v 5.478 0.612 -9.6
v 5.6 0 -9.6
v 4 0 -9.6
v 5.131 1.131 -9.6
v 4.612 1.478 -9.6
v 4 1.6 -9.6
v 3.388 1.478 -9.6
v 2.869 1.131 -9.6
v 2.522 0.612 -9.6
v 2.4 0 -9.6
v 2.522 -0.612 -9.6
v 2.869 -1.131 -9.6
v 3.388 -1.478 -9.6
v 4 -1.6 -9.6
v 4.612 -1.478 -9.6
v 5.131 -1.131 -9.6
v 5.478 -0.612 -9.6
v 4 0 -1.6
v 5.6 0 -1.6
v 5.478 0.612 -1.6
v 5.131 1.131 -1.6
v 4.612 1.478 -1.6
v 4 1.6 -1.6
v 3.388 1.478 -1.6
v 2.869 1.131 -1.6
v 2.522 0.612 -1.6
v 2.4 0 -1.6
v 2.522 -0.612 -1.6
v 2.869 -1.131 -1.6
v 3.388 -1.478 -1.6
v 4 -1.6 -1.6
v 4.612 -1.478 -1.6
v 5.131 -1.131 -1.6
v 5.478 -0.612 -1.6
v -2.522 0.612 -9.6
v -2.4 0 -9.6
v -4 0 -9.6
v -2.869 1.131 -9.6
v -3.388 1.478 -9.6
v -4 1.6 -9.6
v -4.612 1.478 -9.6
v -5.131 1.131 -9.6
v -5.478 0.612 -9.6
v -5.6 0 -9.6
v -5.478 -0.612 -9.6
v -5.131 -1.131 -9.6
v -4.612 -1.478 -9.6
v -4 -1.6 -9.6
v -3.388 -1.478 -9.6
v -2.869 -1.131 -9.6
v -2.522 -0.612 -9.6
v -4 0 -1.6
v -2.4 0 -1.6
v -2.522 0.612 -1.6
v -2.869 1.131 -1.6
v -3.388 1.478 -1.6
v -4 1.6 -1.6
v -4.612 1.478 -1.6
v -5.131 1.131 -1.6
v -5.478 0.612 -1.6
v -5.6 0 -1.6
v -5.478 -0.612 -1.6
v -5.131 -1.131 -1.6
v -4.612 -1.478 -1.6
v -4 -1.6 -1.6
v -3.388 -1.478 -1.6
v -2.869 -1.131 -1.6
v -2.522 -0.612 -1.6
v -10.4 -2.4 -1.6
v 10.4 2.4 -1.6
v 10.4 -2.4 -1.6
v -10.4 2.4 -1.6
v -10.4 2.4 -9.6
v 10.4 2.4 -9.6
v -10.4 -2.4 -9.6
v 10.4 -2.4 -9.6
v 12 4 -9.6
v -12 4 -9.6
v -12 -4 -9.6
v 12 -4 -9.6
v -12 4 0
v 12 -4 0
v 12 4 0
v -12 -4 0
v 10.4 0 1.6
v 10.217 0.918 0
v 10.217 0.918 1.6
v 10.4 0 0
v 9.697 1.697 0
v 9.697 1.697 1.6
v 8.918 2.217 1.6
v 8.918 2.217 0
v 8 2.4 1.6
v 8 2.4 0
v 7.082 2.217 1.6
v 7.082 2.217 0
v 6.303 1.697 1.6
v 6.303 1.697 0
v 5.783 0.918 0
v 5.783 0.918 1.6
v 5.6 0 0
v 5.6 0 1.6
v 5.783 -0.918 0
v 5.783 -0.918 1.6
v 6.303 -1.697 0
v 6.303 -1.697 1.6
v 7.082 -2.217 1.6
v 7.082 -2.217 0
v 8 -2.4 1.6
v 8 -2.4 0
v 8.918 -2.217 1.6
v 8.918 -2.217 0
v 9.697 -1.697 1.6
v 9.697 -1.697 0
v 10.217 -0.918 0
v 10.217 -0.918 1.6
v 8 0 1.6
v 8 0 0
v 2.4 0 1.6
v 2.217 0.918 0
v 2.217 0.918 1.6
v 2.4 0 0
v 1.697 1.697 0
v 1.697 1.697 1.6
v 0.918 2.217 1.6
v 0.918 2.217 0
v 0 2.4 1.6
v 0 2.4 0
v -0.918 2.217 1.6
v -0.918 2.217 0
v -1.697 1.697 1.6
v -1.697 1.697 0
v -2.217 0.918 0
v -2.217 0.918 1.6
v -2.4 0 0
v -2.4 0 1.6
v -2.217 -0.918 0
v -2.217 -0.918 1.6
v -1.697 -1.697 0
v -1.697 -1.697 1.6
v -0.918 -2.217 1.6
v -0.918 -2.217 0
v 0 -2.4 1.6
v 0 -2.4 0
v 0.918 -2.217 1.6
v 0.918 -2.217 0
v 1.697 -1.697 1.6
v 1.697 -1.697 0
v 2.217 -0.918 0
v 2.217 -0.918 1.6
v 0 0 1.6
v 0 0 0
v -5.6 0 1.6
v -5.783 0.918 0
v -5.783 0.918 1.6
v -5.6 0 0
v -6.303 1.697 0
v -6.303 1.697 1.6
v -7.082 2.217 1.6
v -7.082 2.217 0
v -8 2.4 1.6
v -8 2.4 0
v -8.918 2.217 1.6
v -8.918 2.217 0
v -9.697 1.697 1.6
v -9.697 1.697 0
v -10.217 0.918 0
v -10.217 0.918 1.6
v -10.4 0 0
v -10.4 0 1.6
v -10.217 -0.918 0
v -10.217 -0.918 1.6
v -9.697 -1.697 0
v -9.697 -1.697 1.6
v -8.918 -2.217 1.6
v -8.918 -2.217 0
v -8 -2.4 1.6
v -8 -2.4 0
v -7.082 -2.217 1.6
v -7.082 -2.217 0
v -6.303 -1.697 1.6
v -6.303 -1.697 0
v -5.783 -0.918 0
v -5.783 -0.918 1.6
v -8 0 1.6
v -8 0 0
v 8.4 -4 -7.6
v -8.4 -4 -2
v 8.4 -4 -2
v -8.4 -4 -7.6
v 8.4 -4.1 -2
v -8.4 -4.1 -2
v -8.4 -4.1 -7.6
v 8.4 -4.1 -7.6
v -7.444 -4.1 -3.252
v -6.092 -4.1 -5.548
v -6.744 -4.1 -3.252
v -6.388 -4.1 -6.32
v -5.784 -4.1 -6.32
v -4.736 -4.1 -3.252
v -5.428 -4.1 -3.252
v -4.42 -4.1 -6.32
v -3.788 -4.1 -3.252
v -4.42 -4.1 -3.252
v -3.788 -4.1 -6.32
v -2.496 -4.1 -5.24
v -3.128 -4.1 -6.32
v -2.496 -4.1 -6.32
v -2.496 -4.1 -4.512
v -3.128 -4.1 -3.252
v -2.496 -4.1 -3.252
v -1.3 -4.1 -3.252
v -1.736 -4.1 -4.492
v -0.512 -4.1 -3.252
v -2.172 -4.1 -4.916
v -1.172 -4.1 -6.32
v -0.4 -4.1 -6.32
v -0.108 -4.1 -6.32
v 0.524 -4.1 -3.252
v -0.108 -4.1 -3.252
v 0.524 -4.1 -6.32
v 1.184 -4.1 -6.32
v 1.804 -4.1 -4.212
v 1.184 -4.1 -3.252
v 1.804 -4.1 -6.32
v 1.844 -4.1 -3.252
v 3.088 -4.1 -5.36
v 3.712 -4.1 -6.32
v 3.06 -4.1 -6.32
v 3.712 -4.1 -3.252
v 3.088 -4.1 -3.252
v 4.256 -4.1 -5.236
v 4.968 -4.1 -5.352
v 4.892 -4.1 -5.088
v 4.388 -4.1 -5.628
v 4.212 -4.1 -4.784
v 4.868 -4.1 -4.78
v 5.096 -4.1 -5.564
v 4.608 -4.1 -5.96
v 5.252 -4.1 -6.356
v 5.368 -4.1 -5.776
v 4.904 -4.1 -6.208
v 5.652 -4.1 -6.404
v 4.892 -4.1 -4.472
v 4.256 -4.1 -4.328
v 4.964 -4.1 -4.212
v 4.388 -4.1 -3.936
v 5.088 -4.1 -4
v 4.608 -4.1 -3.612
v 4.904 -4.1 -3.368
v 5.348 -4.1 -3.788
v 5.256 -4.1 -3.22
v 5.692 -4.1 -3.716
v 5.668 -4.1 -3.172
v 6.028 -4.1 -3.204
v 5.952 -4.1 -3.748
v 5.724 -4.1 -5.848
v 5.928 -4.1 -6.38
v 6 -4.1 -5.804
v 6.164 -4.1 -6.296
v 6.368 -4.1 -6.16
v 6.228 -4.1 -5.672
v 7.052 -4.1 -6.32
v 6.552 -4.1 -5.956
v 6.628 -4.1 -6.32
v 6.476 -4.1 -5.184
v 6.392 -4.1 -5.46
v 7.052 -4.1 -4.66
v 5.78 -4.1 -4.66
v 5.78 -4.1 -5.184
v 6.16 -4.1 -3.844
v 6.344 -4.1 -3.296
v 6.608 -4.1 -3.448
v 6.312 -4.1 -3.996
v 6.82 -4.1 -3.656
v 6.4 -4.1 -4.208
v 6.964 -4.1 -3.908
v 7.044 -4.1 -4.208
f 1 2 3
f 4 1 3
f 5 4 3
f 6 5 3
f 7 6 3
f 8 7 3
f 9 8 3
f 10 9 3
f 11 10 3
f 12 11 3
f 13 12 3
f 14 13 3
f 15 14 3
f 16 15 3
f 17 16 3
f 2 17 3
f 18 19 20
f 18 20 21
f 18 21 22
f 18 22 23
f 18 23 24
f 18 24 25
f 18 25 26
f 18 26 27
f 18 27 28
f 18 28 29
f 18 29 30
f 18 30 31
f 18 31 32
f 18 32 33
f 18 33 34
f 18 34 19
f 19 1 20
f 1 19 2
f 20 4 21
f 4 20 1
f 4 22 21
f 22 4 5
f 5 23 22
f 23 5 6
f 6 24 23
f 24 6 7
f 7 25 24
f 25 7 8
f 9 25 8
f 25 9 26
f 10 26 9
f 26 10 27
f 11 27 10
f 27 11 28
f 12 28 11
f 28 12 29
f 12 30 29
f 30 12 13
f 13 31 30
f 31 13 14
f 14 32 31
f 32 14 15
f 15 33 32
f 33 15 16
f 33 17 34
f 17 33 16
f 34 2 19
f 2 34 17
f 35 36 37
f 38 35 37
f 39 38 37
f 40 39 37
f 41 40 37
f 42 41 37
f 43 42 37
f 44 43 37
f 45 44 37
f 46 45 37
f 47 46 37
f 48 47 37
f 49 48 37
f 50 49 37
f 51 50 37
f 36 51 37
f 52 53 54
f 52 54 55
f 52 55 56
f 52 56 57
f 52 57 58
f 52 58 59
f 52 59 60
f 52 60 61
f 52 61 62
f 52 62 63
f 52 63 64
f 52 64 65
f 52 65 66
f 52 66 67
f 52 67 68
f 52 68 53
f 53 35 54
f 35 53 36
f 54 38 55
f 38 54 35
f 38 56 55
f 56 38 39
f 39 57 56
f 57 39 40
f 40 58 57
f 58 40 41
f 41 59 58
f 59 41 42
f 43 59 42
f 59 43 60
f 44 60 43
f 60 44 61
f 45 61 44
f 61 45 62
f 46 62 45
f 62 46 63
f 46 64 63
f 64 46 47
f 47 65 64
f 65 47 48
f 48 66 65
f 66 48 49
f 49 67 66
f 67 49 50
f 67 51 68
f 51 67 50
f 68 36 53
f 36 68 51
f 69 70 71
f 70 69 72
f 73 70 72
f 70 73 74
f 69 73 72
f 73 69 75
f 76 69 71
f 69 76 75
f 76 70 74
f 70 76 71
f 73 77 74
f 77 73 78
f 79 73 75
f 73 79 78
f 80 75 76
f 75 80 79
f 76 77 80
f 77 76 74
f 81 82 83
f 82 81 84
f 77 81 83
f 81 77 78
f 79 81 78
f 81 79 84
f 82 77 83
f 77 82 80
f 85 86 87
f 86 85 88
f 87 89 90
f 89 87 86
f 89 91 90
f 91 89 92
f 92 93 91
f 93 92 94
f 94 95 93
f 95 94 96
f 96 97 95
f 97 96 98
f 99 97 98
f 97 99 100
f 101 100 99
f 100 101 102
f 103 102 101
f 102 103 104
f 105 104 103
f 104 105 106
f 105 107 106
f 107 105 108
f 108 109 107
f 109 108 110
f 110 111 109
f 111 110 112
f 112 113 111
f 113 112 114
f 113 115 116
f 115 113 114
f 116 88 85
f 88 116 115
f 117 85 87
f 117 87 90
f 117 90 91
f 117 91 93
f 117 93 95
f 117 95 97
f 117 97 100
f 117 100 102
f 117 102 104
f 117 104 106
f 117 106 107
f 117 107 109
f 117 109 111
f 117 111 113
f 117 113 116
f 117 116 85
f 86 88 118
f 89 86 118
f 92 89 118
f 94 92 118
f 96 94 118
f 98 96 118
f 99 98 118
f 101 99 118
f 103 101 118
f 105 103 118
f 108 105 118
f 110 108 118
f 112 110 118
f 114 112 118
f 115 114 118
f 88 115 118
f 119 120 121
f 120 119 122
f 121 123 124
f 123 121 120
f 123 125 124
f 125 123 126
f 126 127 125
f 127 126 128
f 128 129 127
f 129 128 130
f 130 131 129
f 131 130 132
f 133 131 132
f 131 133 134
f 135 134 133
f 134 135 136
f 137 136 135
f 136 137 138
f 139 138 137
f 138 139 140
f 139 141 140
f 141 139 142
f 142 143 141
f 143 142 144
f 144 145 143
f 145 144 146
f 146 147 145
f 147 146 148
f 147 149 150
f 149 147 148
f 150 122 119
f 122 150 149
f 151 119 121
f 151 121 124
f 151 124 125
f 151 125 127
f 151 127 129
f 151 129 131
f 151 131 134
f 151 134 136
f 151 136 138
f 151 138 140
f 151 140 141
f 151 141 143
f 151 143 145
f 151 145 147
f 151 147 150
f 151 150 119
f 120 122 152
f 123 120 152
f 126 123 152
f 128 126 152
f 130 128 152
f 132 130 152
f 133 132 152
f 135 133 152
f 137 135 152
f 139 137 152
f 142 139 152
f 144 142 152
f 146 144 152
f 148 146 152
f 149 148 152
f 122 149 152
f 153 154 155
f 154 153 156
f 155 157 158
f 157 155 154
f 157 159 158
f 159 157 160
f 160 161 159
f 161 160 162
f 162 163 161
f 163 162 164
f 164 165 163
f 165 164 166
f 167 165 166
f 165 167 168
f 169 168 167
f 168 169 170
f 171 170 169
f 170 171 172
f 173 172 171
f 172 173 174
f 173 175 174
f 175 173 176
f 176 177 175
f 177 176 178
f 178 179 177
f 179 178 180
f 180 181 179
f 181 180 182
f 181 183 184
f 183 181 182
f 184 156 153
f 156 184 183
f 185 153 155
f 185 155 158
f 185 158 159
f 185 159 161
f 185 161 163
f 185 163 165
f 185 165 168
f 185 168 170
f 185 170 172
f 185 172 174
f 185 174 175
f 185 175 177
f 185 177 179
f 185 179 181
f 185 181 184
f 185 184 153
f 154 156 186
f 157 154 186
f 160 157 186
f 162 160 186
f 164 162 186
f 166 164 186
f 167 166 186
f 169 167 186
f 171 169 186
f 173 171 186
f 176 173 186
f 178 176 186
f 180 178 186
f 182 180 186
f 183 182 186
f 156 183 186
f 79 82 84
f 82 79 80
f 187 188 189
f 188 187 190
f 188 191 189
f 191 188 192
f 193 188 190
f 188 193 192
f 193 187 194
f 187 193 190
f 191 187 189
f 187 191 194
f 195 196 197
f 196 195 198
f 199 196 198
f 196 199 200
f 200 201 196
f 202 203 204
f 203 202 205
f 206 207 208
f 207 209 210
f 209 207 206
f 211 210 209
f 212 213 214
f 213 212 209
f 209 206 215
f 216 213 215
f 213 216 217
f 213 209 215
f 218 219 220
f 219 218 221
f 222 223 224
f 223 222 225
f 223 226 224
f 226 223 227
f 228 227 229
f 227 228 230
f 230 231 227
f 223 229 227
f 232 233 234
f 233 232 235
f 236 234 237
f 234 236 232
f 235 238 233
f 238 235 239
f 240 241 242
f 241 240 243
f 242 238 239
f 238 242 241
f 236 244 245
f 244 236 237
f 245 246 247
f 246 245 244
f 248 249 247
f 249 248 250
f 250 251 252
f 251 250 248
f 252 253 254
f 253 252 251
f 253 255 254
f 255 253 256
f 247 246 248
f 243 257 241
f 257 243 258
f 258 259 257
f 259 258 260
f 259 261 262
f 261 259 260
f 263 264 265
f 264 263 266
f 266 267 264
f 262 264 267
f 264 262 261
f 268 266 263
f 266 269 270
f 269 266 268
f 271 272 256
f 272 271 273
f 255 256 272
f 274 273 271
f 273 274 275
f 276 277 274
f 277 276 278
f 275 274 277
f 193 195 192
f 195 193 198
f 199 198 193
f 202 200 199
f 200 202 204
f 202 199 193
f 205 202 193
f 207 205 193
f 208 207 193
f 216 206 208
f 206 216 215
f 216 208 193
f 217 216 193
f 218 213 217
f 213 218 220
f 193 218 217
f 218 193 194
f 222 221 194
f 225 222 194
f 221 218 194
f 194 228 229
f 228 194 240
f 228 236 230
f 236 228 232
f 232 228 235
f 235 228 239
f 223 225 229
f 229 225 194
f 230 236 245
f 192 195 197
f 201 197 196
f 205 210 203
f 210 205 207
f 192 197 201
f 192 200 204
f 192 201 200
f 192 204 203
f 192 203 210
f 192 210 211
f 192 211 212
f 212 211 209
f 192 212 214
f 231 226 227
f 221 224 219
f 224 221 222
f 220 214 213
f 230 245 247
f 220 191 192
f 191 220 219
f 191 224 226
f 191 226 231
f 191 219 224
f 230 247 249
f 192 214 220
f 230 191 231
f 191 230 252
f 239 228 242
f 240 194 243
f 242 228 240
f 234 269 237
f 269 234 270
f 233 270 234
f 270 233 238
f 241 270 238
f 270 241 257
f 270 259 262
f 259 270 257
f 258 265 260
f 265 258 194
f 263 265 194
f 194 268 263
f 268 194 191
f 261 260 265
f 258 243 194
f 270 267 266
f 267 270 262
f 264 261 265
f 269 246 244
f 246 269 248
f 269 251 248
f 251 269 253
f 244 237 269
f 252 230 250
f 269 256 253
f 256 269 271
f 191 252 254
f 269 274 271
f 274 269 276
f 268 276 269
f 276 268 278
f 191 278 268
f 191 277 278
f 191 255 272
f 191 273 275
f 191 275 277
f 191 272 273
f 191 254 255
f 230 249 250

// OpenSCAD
// file: ../p/4-4edge.scad
use <../lib.scad>
function ldraw_lib__4_4edge() = [
// 0 Circle 1.0
// 0 Name: 4-4edge.dat
// 0 Author: James Jessiman
// 0 !LDRAW_ORG Primitive UPDATE 2017-01
// 0 !LICENSE Licensed under CC BY 2.0 and CC BY 4.0 : see CAreadme.txt
// 
// 0 BFC CERTIFY CCW
  [0,"BFC","CERTIFY"],
  [0,"BFC","CCW"],
// 
// 0 !HISTORY 1998-12-15 [PTadmin] Official Update 1998-10
// 0 !HISTORY 2005-12-28 [PTadmin] Official Update 2005-01
// 0 !HISTORY 2007-06-24 [PTadmin] Header formatted for Contributor Agreement
// 0 !HISTORY 2008-07-01 [PTadmin] Official Update 2008-01
// 0 !HISTORY 2017-01-15 [Steffen] BFCed
// 0 !HISTORY 2017-12-30 [PTadmin] Official Update 2017-01
// 
// 
// 2 24 1 0 0 0.9239 0 0.3827
  [2,24,1,0,0,0.9239,0,0.3827],
// 2 24 0.9239 0 0.3827 0.7071 0 0.7071
  [2,24,0.9239,0,0.3827,0.7071,0,0.7071],
// 2 24 0.7071 0 0.7071 0.3827 0 0.9239
  [2,24,0.7071,0,0.7071,0.3827,0,0.9239],
// 2 24 0.3827 0 0.9239 0 0 1
  [2,24,0.3827,0,0.9239,0,0,1],
// 2 24 0 0 1 -0.3827 0 0.9239
  [2,24,0,0,1,-0.3827,0,0.9239],
// 2 24 -0.3827 0 0.9239 -0.7071 0 0.7071
  [2,24,-0.3827,0,0.9239,-0.7071,0,0.7071],
// 2 24 -0.7071 0 0.7071 -0.9239 0 0.3827
  [2,24,-0.7071,0,0.7071,-0.9239,0,0.3827],
// 2 24 -0.9239 0 0.3827 -1 0 -0
  [2,24,-0.9239,0,0.3827,-1,0,-0],
// 2 24 -1 0 -0 -0.9239 0 -0.3827
  [2,24,-1,0,-0,-0.9239,0,-0.3827],
// 2 24 -0.9239 0 -0.3827 -0.7071 0 -0.7071
  [2,24,-0.9239,0,-0.3827,-0.7071,0,-0.7071],
// 2 24 -0.7071 0 -0.7071 -0.3827 0 -0.9239
  [2,24,-0.7071,0,-0.7071,-0.3827,0,-0.9239],
// 2 24 -0.3827 0 -0.9239 0 0 -1
  [2,24,-0.3827,0,-0.9239,0,0,-1],
// 2 24 0 0 -1 0.3827 0 -0.9239
  [2,24,0,0,-1,0.3827,0,-0.9239],
// 2 24 0.3827 0 -0.9239 0.7071 0 -0.7071
  [2,24,0.3827,0,-0.9239,0.7071,0,-0.7071],
// 2 24 0.7071 0 -0.7071 0.9239 0 -0.3827
  [2,24,0.7071,0,-0.7071,0.9239,0,-0.3827],
// 2 24 0.9239 0 -0.3827 1 0 0
  [2,24,0.9239,0,-0.3827,1,0,0],
];
module ldraw_lib__4_4edge(step=0, col=false, unit=2/5, alt=false, line=0.2, solid=!$preview)
    makepoly(ldraw_lib__4_4edge(), step=step, col=col, unit=unit, alt=alt, line=line, solid=solid);
ldraw_lib__4_4edge(line=0.2);
// file: ../p/4-4disc.scad
use <../lib.scad>
function ldraw_lib__4_4disc() = [
// 0 Disc 1.0
// 0 Name: 4-4disc.dat
// 0 Author: James Jessiman
// 0 !LDRAW_ORG Primitive UPDATE 2002-02
// 0 !LICENSE Licensed under CC BY 2.0 and CC BY 4.0 : see CAreadme.txt
// 
// 0 BFC CERTIFY CCW
  [0,"BFC","CERTIFY"],
  [0,"BFC","CCW"],
// 
// 0 !HISTORY 1998-12-15 [PTadmin] Official Update 1998-10
// 0 !HISTORY 2002-03-23 [sbliss] Added BFC statement
// 0 !HISTORY 2002-04-25 [PTadmin] Official Update 2002-02
// 0 !HISTORY 2007-06-24 [PTadmin] Header formatted for Contributor Agreement
// 0 !HISTORY 2008-07-01 [PTadmin] Official Update 2008-01
// 
// 
// 3 16 0 0 0 1 0 0 0.9239 0 0.3827
  [3,16,0,0,0,1,0,0,0.9239,0,0.3827],
// 3 16 0 0 0 0.9239 0 0.3827 0.7071 0 0.7071
  [3,16,0,0,0,0.9239,0,0.3827,0.7071,0,0.7071],
// 3 16 0 0 0 0.7071 0 0.7071 0.3827 0 0.9239
  [3,16,0,0,0,0.7071,0,0.7071,0.3827,0,0.9239],
// 3 16 0 0 0 0.3827 0 0.9239 0 0 1
  [3,16,0,0,0,0.3827,0,0.9239,0,0,1],
// 3 16 0 0 0 0 0 1 -0.3827 0 0.9239
  [3,16,0,0,0,0,0,1,-0.3827,0,0.9239],
// 3 16 0 0 0 -0.3827 0 0.9239 -0.7071 0 0.7071
  [3,16,0,0,0,-0.3827,0,0.9239,-0.7071,0,0.7071],
// 3 16 0 0 0 -0.7071 0 0.7071 -0.9239 0 0.3827
  [3,16,0,0,0,-0.7071,0,0.7071,-0.9239,0,0.3827],
// 3 16 0 0 0 -0.9239 0 0.3827 -1 0 -0
  [3,16,0,0,0,-0.9239,0,0.3827,-1,0,-0],
// 3 16 0 0 0 -1 0 -0 -0.9239 0 -0.3827
  [3,16,0,0,0,-1,0,-0,-0.9239,0,-0.3827],
// 3 16 0 0 0 -0.9239 0 -0.3827 -0.7071 0 -0.7071
  [3,16,0,0,0,-0.9239,0,-0.3827,-0.7071,0,-0.7071],
// 3 16 0 0 0 -0.7071 0 -0.7071 -0.3827 0 -0.9239
  [3,16,0,0,0,-0.7071,0,-0.7071,-0.3827,0,-0.9239],
// 3 16 0 0 0 -0.3827 0 -0.9239 0 0 -1
  [3,16,0,0,0,-0.3827,0,-0.9239,0,0,-1],
// 3 16 0 0 0 0 0 -1 0.3827 0 -0.9239
  [3,16,0,0,0,0,0,-1,0.3827,0,-0.9239],
// 3 16 0 0 0 0.3827 0 -0.9239 0.7071 0 -0.7071
  [3,16,0,0,0,0.3827,0,-0.9239,0.7071,0,-0.7071],
// 3 16 0 0 0 0.7071 0 -0.7071 0.9239 0 -0.3827
  [3,16,0,0,0,0.7071,0,-0.7071,0.9239,0,-0.3827],
// 3 16 0 0 0 0.9239 0 -0.3827 1 0 0
  [3,16,0,0,0,0.9239,0,-0.3827,1,0,0],
// 0
];
module ldraw_lib__4_4disc(step=0, col=false, unit=2/5, alt=false, line=0.2, solid=!$preview)
    makepoly(ldraw_lib__4_4disc(), step=step, col=col, unit=unit, alt=alt, line=line, solid=solid);
ldraw_lib__4_4disc(line=0.2);
// file: ../p/4-4cyli.scad
use <../lib.scad>
$fa=1; $fs=0.2;
function ldraw_lib__4_4cyli(realsolid=false) = [
// 0 Cylinder 1.0
// 0 Name: 4-4cyli.dat
// 0 Author: James Jessiman
// 0 !LDRAW_ORG Primitive UPDATE 2005-01
// 0 !LICENSE Licensed under CC BY 2.0 and CC BY 4.0 : see CAreadme.txt
// 
// 0 BFC CERTIFY CCW
  [0,"BFC","CERTIFY"],
  [0,"BFC","CCW"],
// 
// 0 !HISTORY 1998-12-15 [PTadmin] Official Update 1998-10
// 0 !HISTORY 2002-03-23 [sbliss] Added BFC statement; merged headers from files in distributions LDraw 0.27 and Complete.
// 0 !HISTORY 2002-04-25 [PTadmin] Official Update 2002-02
// 0 !HISTORY 2004-12-14 [guyvivan] BFC CCW
// 0 !HISTORY 2005-12-28 [PTadmin] Official Update 2005-01
// 0 !HISTORY 2007-06-24 [PTadmin] Header formatted for Contributor Agreement
// 0 !HISTORY 2008-07-01 [PTadmin] Official Update 2008-01
// 
// 
// 4 16 1 1 0 0.9239 1 0.3827 0.9239 0 0.3827 1 0 0
  [4,16,1,1,0,0.9239,1,0.3827,0.9239,0,0.3827,1,0,0],
// 5 24 1 0 0 1 1 0 0.9239 0 0.3827 0.9239 0 -0.3827
  [5,24,1,0,0,1,1,0,0.9239,0,0.3827,0.9239,0,-0.3827],
// 4 16 0.9239 1 0.3827 0.7071 1 0.7071 0.7071 0 0.7071 0.9239 0 0.3827
  [4,16,0.9239,1,0.3827,0.7071,1,0.7071,0.7071,0,0.7071,0.9239,0,0.3827],
// 5 24 0.9239 0 0.3827 0.9239 1 0.3827 0.7071 0 0.7071 1 0 0
  [5,24,0.9239,0,0.3827,0.9239,1,0.3827,0.7071,0,0.7071,1,0,0],
// 4 16 0.7071 1 0.7071 0.3827 1 0.9239 0.3827 0 0.9239 0.7071 0 0.7071
  [4,16,0.7071,1,0.7071,0.3827,1,0.9239,0.3827,0,0.9239,0.7071,0,0.7071],
// 5 24 0.7071 0 0.7071 0.7071 1 0.7071 0.3827 0 0.9239 0.9239 0 0.3827
  [5,24,0.7071,0,0.7071,0.7071,1,0.7071,0.3827,0,0.9239,0.9239,0,0.3827],
// 4 16 0.3827 1 0.9239 0 1 1 0 0 1 0.3827 0 0.9239
  [4,16,0.3827,1,0.9239,0,1,1,0,0,1,0.3827,0,0.9239],
// 5 24 0.3827 0 0.9239 0.3827 1 0.9239 0 0 1 0.7071 0 0.7071
  [5,24,0.3827,0,0.9239,0.3827,1,0.9239,0,0,1,0.7071,0,0.7071],
// 4 16 0 1 1 -0.3827 1 0.9239 -0.3827 0 0.9239 0 0 1
  [4,16,0,1,1,-0.3827,1,0.9239,-0.3827,0,0.9239,0,0,1],
// 5 24 0 0 1 0 1 1 -0.3827 0 0.9239 0.3827 0 0.9239
  [5,24,0,0,1,0,1,1,-0.3827,0,0.9239,0.3827,0,0.9239],
// 4 16 -0.3827 1 0.9239 -0.7071 1 0.7071 -0.7071 0 0.7071 -0.3827 0 0.9239
  [4,16,-0.3827,1,0.9239,-0.7071,1,0.7071,-0.7071,0,0.7071,-0.3827,0,0.9239],
// 5 24 -0.3827 0 0.9239 -0.3827 1 0.9239 -0.7071 0 0.7071 0 0 1
  [5,24,-0.3827,0,0.9239,-0.3827,1,0.9239,-0.7071,0,0.7071,0,0,1],
// 4 16 -0.7071 1 0.7071 -0.9239 1 0.3827 -0.9239 0 0.3827 -0.7071 0 0.7071
  [4,16,-0.7071,1,0.7071,-0.9239,1,0.3827,-0.9239,0,0.3827,-0.7071,0,0.7071],
// 5 24 -0.7071 0 0.7071 -0.7071 1 0.7071 -0.9239 0 0.3827 -0.3827 0 0.9239
  [5,24,-0.7071,0,0.7071,-0.7071,1,0.7071,-0.9239,0,0.3827,-0.3827,0,0.9239],
// 4 16 -0.9239 1 0.3827 -1 1 0 -1 0 0 -0.9239 0 0.3827
  [4,16,-0.9239,1,0.3827,-1,1,0,-1,0,0,-0.9239,0,0.3827],
// 5 24 -0.9239 0 0.3827 -0.9239 1 0.3827 -1 0 0 -0.7071 0 0.7071
  [5,24,-0.9239,0,0.3827,-0.9239,1,0.3827,-1,0,0,-0.7071,0,0.7071],
// 4 16 -1 1 0 -0.9239 1 -0.3827 -0.9239 0 -0.3827 -1 0 0
  [4,16,-1,1,0,-0.9239,1,-0.3827,-0.9239,0,-0.3827,-1,0,0],
// 5 24 -1 0 0 -1 1 0 -0.9239 0 -0.3827 -0.9239 0 0.3827
  [5,24,-1,0,0,-1,1,0,-0.9239,0,-0.3827,-0.9239,0,0.3827],
// 4 16 -0.9239 1 -0.3827 -0.7071 1 -0.7071 -0.7071 0 -0.7071 -0.9239 0 -0.3827
  [4,16,-0.9239,1,-0.3827,-0.7071,1,-0.7071,-0.7071,0,-0.7071,-0.9239,0,-0.3827],
// 5 24 -0.9239 0 -0.3827 -0.9239 1 -0.3827 -0.7071 0 -0.7071 -1 0 0
  [5,24,-0.9239,0,-0.3827,-0.9239,1,-0.3827,-0.7071,0,-0.7071,-1,0,0],
// 4 16 -0.7071 1 -0.7071 -0.3827 1 -0.9239 -0.3827 0 -0.9239 -0.7071 0 -0.7071
  [4,16,-0.7071,1,-0.7071,-0.3827,1,-0.9239,-0.3827,0,-0.9239,-0.7071,0,-0.7071],
// 5 24 -0.7071 0 -0.7071 -0.7071 1 -0.7071 -0.3827 0 -0.9239 -0.9239 0 -0.3827
  [5,24,-0.7071,0,-0.7071,-0.7071,1,-0.7071,-0.3827,0,-0.9239,-0.9239,0,-0.3827],
// 4 16 -0.3827 1 -0.9239 0 1 -1 0 0 -1 -0.3827 0 -0.9239
  [4,16,-0.3827,1,-0.9239,0,1,-1,0,0,-1,-0.3827,0,-0.9239],
// 5 24 -0.3827 0 -0.9239 -0.3827 1 -0.9239 0 0 -1 -0.7071 0 -0.7071
  [5,24,-0.3827,0,-0.9239,-0.3827,1,-0.9239,0,0,-1,-0.7071,0,-0.7071],
// 4 16 0 1 -1 0.3827 1 -0.9239 0.3827 0 -0.9239 0 0 -1
  [4,16,0,1,-1,0.3827,1,-0.9239,0.3827,0,-0.9239,0,0,-1],
// 5 24 0 0 -1 0 1 -1 0.3827 0 -0.9239 -0.3827 0 -0.9239
  [5,24,0,0,-1,0,1,-1,0.3827,0,-0.9239,-0.3827,0,-0.9239],
// 4 16 0.3827 1 -0.9239 0.7071 1 -0.7071 0.7071 0 -0.7071 0.3827 0 -0.9239
  [4,16,0.3827,1,-0.9239,0.7071,1,-0.7071,0.7071,0,-0.7071,0.3827,0,-0.9239],
// 5 24 0.3827 0 -0.9239 0.3827 1 -0.9239 0.7071 0 -0.7071 0 0 -1
  [5,24,0.3827,0,-0.9239,0.3827,1,-0.9239,0.7071,0,-0.7071,0,0,-1],
// 4 16 0.7071 1 -0.7071 0.9239 1 -0.3827 0.9239 0 -0.3827 0.7071 0 -0.7071
  [4,16,0.7071,1,-0.7071,0.9239,1,-0.3827,0.9239,0,-0.3827,0.7071,0,-0.7071],
// 5 24 0.7071 0 -0.7071 0.7071 1 -0.7071 0.9239 0 -0.3827 0.3827 0 -0.9239
  [5,24,0.7071,0,-0.7071,0.7071,1,-0.7071,0.9239,0,-0.3827,0.3827,0,-0.9239],
// 4 16 0.9239 1 -0.3827 1 1 0 1 0 0 0.9239 0 -0.3827
  [4,16,0.9239,1,-0.3827,1,1,0,1,0,0,0.9239,0,-0.3827],
// 5 24 0.9239 0 -0.3827 0.9239 1 -0.3827 1 0 0 0.7071 0 -0.7071
  [5,24,0.9239,0,-0.3827,0.9239,1,-0.3827,1,0,0,0.7071,0,-0.7071],
// 0
];
module ldraw_lib__4_4cyli(step=0, col=false, unit=2/5, alt=false, line=0.2, solid=!$preview)
    makepoly(ldraw_lib__4_4cyli(solid), step=step, col=col, unit=unit, alt=alt, line=line, solid=solid);
ldraw_lib__4_4cyli(line=0.2);
// file: ../p/stud3.scad
use <../lib.scad>
use <4-4cyli.scad>
use <4-4disc.scad>
use <4-4edge.scad>
function ldraw_lib__stud3() = [
// 0 Stud Tube Solid
// 0 Name: stud3.dat
// 0 Author: James Jessiman
// 0 !LDRAW_ORG Primitive UPDATE 2012-01
// 0 !LICENSE Licensed under CC BY 4.0 : see CAreadme.txt
// 
// 0 BFC CERTIFY CCW
  [0,"BFC","CERTIFY"],
  [0,"BFC","CCW"],
// 
// 0 !HISTORY 2002-04-04 [sbliss] Modified for BFC compliance
// 0 !HISTORY 2002-04-25 [PTadmin] Official Update 2002-02
// 0 !HISTORY 2007-06-24 [PTadmin] Header formatted for Contributor Agreement
// 0 !HISTORY 2008-07-01 [PTadmin] Official Update 2008-01
// 0 !HISTORY 2012-02-16 [Philo] Changed to CCW
// 0 !HISTORY 2012-03-30 [PTadmin] Official Update 2012-01
// 
// 
// 1 16 0 -4 0 4 0 0 0 1 0 0 0 4 4-4edge.dat
  [1,16,0,-4,0,4,0,0,0,1,0,0,0,4, ldraw_lib__4_4edge()],
// 1 16 0 0 0 4 0 0 0 1 0 0 0 4 4-4edge.dat
  [1,16,0,0,0,4,0,0,0,1,0,0,0,4, ldraw_lib__4_4edge()],
// 1 16 0 -4 0 4 0 0 0 1 0 0 0 4 4-4disc.dat
  [1,16,0,-4,0,4,0,0,0,1,0,0,0,4, ldraw_lib__4_4disc()],
  [-1,16,0,0,0,4,0,0,0,-1,0,0,0,4, ldraw_lib__4_4disc()],
// 1 16 0 -4 0 4 0 0 0 4 0 0 0 4 4-4cyli.dat
  [1,16,0,-4,0,4,0,0,0,4,0,0,0,4, ldraw_lib__4_4cyli()],
];
module ldraw_lib__stud3(step=0, col=false, unit=2/5, alt=false, line=0.2, solid=!$preview)
    makepoly(ldraw_lib__stud3(), step=step, col=col, unit=unit, alt=alt, line=line, solid=solid);
ldraw_lib__stud3(line=0.2);
// file: ../p/stud.scad
use <../lib.scad>
use <4-4cyli.scad>
use <4-4disc.scad>
use <4-4edge.scad>
function ldraw_lib__stud() = [
// 0 Stud
// 0 Name: stud.dat
// 0 Author: James Jessiman
// 0 !LDRAW_ORG Primitive UPDATE 2012-01
// 0 !LICENSE Licensed under CC BY 4.0 : see CAreadme.txt
// 
// 0 BFC CERTIFY CCW
  [0,"BFC","CERTIFY"],
  [0,"BFC","CCW"],
// 
// 0 !HISTORY 2002-04-04 [sbliss] Modified for BFC compliance
// 0 !HISTORY 2002-04-25 [PTadmin] Official Update 2002-02
// 0 !HISTORY 2007-06-24 [PTadmin] Header formatted for Contributor Agreement
// 0 !HISTORY 2008-07-01 [PTadmin] Official Update 2008-01
// 0 !HISTORY 2012-02-16 [Philo] Changed to CCW
// 0 !HISTORY 2012-03-30 [PTadmin] Official Update 2012-01
// 
// 
// 1 16 0 0 0 6 0 0 0 1 0 0 0 6 4-4edge.dat
  [1,16,0,0,0,6,0,0,0,1,0,0,0,6, ldraw_lib__4_4edge()],
// 1 16 0 -4 0 6 0 0 0 1 0 0 0 6 4-4edge.dat
  [1,16,0,-4,0,6,0,0,0,1,0,0,0,6, ldraw_lib__4_4edge()],
// 1 16 0 0 0 6 0 0 0 -4 0 0 0 6 4-4cyli.dat
  [1,16,0,0,0,6,0,0,0,-4,0,0,0,6, ldraw_lib__4_4cyli()],
// 1 16 0 -4 0 6 0 0 0 1 0 0 0 6 4-4disc.dat
  [1,16,0,-4,0,6,0,0,0,1,0,0,0,6, ldraw_lib__4_4disc()],
  [-1,16,0,0,0,6,0,0,0,-1,0,0,0,6, ldraw_lib__4_4disc()],
];
module ldraw_lib__stud(step=0, col=false, unit=2/5, alt=false, line=0.2, solid=!$preview)
    makepoly(ldraw_lib__stud(), step=step, col=col, unit=unit, alt=alt, line=line, solid=solid);
ldraw_lib__stud(line=0.2);
// file: ../p/box5.scad
use <../lib.scad>
function ldraw_lib__box5() = [
// 0 Box with 5 Faces and All Edges
// 0 Name: box5.dat
// 0 Author: James Jessiman
// 0 !LDRAW_ORG Primitive UPDATE 2012-01
// 0 !LICENSE Licensed under CC BY 2.0 and CC BY 4.0 : see CAreadme.txt
// 
// 0 BFC CERTIFY CCW
  [0,"BFC","CERTIFY"],
  [0,"BFC","CCW"],
// 
// 0 !HISTORY 2002-04-03 [sbliss] Modified for BFC compliance
// 0 !HISTORY 2002-04-25 [PTadmin] Official Update 2002-02
// 0 !HISTORY 2007-06-24 [PTadmin] Header formatted for Contributor Agreement
// 0 !HISTORY 2008-07-01 [PTadmin] Official Update 2008-01
// 0 !HISTORY 2012-02-16 [Philo] Changed to CCW
// 0 !HISTORY 2012-03-30 [PTadmin] Official Update 2012-01
// 
// 
// 2 24 1 1 1 -1 1 1
  [2,24,1,1,1,-1,1,1],
// 2 24 -1 1 1 -1 1 -1
  [2,24,-1,1,1,-1,1,-1],
// 2 24 -1 1 -1 1 1 -1
  [2,24,-1,1,-1,1,1,-1],
// 2 24 1 1 -1 1 1 1
  [2,24,1,1,-1,1,1,1],
// 2 24 1 0 1 -1 0 1
  [2,24,1,0,1,-1,0,1],
// 2 24 -1 0 1 -1 0 -1
  [2,24,-1,0,1,-1,0,-1],
// 2 24 -1 0 -1 1 0 -1
  [2,24,-1,0,-1,1,0,-1],
// 2 24 1 0 -1 1 0 1
  [2,24,1,0,-1,1,0,1],
// 2 24 1 0 1 1 1 1
  [2,24,1,0,1,1,1,1],
// 2 24 -1 0 1 -1 1 1
  [2,24,-1,0,1,-1,1,1],
// 2 24 1 0 -1 1 1 -1
  [2,24,1,0,-1,1,1,-1],
// 2 24 -1 0 -1 -1 1 -1
  [2,24,-1,0,-1,-1,1,-1],
// 4 16 -1 1 1 1 1 1 1 1 -1 -1 1 -1
  [4,16,-1,1,1,1,1,1,1,1,-1,-1,1,-1],
// 4 16 -1 1 1 -1 0 1 1 0 1 1 1 1
  [4,16,-1,1,1,-1,0,1,1,0,1,1,1,1],
// 4 16 -1 1 -1 -1 0 -1 -1 0 1 -1 1 1
  [4,16,-1,1,-1,-1,0,-1,-1,0,1,-1,1,1],
// 4 16 1 1 -1 1 0 -1 -1 0 -1 -1 1 -1
  [4,16,1,1,-1,1,0,-1,-1,0,-1,-1,1,-1],
// 4 16 1 1 1 1 0 1 1 0 -1 1 1 -1
  [4,16,1,1,1,1,0,1,1,0,-1,1,1,-1],
];
makepoly(ldraw_lib__box5(), line=0.2);
// file: ../p/box4t.scad
use <../lib.scad>
function ldraw_lib__box4t() = [
// 0 Box with 4 Adjacent Faces and All Edges
// 0 Name: box4t.dat
// 0 Author: Tore Eriksson [Tore_Eriksson]
// 0 !LDRAW_ORG Primitive UPDATE 2003-02
// 0 !LICENSE Licensed under CC BY 2.0 and CC BY 4.0 : see CAreadme.txt
// 
// 0 BFC CERTIFY CCW
  [0,"BFC","CERTIFY"],
  [0,"BFC","CCW"],
// 
// 0 !HISTORY 1997-09-29 [PTadmin] Official Update 1997-15
// 0 !HISTORY 2002-08-31 [izanette] Modified with WINDZ for BFC compliance
// 0 !HISTORY 2003-08-01 [PTadmin] Official Update 2003-02
// 0 !HISTORY 2007-06-24 [PTadmin] Header formatted for Contributor Agreement
// 0 !HISTORY 2008-07-01 [PTadmin] Official Update 2008-01
// 
// 
// 2 24 1 1 1 -1 1 1
  [2,24,1,1,1,-1,1,1],
// 2 24 -1 1 1 -1 1 -1
  [2,24,-1,1,1,-1,1,-1],
// 2 24 -1 1 -1 1 1 -1
  [2,24,-1,1,-1,1,1,-1],
// 2 24 1 1 -1 1 1 1
  [2,24,1,1,-1,1,1,1],
// 2 24 1 0 1 -1 0 1
  [2,24,1,0,1,-1,0,1],
// 2 24 -1 0 1 -1 0 -1
  [2,24,-1,0,1,-1,0,-1],
// 2 24 -1 0 -1 1 0 -1
  [2,24,-1,0,-1,1,0,-1],
// 2 24 1 0 -1 1 0 1
  [2,24,1,0,-1,1,0,1],
// 2 24 1 0 1 1 1 1
  [2,24,1,0,1,1,1,1],
// 2 24 -1 0 1 -1 1 1
  [2,24,-1,0,1,-1,1,1],
// 2 24 1 0 -1 1 1 -1
  [2,24,1,0,-1,1,1,-1],
// 2 24 -1 0 -1 -1 1 -1
  [2,24,-1,0,-1,-1,1,-1],
// 4 16 1 1 1 1 1 -1 -1 1 -1 -1 1 1
  [4,16,1,1,1,1,1,-1,-1,1,-1,-1,1,1],
// 4 16 1 1 1 -1 1 1 -1 0 1 1 0 1
  [4,16,1,1,1,-1,1,1,-1,0,1,1,0,1],
// 4 16 -1 1 1 -1 1 -1 -1 0 -1 -1 0 1
  [4,16,-1,1,1,-1,1,-1,-1,0,-1,-1,0,1],
// 0 4 16 -1 1 -1 -1 0 -1 1 0 -1 1 1 -1
// 4 16 1 1 -1 1 1 1 1 0 1 1 0 -1
  [4,16,1,1,-1,1,1,1,1,0,1,1,0,-1],
// 0
];
makepoly(ldraw_lib__box4t(), line=0.2);
// file: ../p/box5-12.scad
use <../lib.scad>
function ldraw_lib__box5_12() = [
// 0 Box with 5 Faces without Any Edges
// 0 Name: box5-12.dat
// 0 Author: Chris Dee [cwdee]
// 0 !LDRAW_ORG Primitive UPDATE 2009-02
// 0 !LICENSE Licensed under CC BY 2.0 and CC BY 4.0 : see CAreadme.txt
// 
// 0 BFC CERTIFY CCW
  [0,"BFC","CERTIFY"],
  [0,"BFC","CCW"],
// 
// 0 !HISTORY 2009-09-03 [PTadmin] Official Update 2009-02
// 
// 
// 4 16 1 1 1 1 1 -1 -1 1 -1 -1 1 1
  [4,16,1,1,1,1,1,-1,-1,1,-1,-1,1,1],
// 4 16 -1 0 1 1 0 1 1 1 1 -1 1 1
  [4,16,-1,0,1,1,0,1,1,1,1,-1,1,1],
// 4 16 -1 0 -1 -1 0 1 -1 1 1 -1 1 -1
  [4,16,-1,0,-1,-1,0,1,-1,1,1,-1,1,-1],
// 4 16 1 0 -1 -1 0 -1 -1 1 -1 1 1 -1
  [4,16,1,0,-1,-1,0,-1,-1,1,-1,1,1,-1],
// 4 16 1 0 1 1 0 -1 1 1 -1 1 1 1
  [4,16,1,0,1,1,0,-1,1,1,-1,1,1,1],
// 0
];
module ldraw_lib__box5_12(step=0, col=false, unit=2/5, alt=false, line=0.2, solid=!$preview)
    makepoly(ldraw_lib__box5_12(), step=step, col=col, unit=unit, alt=alt, line=line, solid=solid);
ldraw_lib__box5_12(line=0.2);
// file: s/3622s01.scad
use <../../lib.scad>
use <../../p/box4t.scad>
use <../../p/box5.scad>
use <../../p/stud.scad>
use <../../p/stud3.scad>
function ldraw_lib__s__3622s01() = [
// 0 ~Brick  1 x  3 without Front Face
// 0 Name: s\3622s01.dat
// 0 Author: Andy Westrate [westrate]
// 0 !LDRAW_ORG Subpart UPDATE 2004-02
// 0 !LICENSE Licensed under CC BY 2.0 and CC BY 4.0 : see CAreadme.txt
// 
// 0 BFC CERTIFY CCW
  [0,"BFC","CERTIFY"],
  [0,"BFC","CCW"],
// 
// 0 !HISTORY 2003-10-14 [westrate] Subfiled, BFC'd
// 0 !HISTORY 2004-04-22 [PTadmin] Official Update 2004-02
// 0 !HISTORY 2007-08-31 [PTadmin] Header formatted for Contributor Agreement
// 0 !HISTORY 2008-07-01 [PTadmin] Official Update 2008-01
// 
// 
// 0 // Uncomment the following for front face
// 0 // 4 16 30 0 -10 -30 0 -10 -30 24 -10 30 24 -10
// 1 16 10 4 0 1 0 0 0 -5 0 0 0 1 stud3.dat
  [1,16,10,4,0,1,0,0,0,-5,0,0,0,1, ldraw_lib__stud3()],
// 1 16 -10 4 0 1 0 0 0 -5 0 0 0 1 stud3.dat
  [1,16,-10,4,0,1,0,0,0,-5,0,0,0,1, ldraw_lib__stud3()],
// 
// 0 BFC INVERTNEXT
  [0,"BFC","INVERTNEXT"],
// 1 16 0 24 0 26 0 0 0 -20 0 0 0 6 box5.dat
  [1,16,0,24,0,26,0,0,0,-20,0,0,0,6, ldraw_lib__box5()],
// 
// 4 16 30 24 10 26 24 6 -26 24 6 -30 24 10
  [4,16,30,24,10,26,24,6,-26,24,6,-30,24,10],
// 4 16 -30 24 10 -26 24 6 -26 24 -6 -30 24 -10
  [4,16,-30,24,10,-26,24,6,-26,24,-6,-30,24,-10],
// 4 16 -30 24 -10 -26 24 -6 26 24 -6 30 24 -10
  [4,16,-30,24,-10,-26,24,-6,26,24,-6,30,24,-10],
// 4 16 30 24 -10 26 24 -6 26 24 6 30 24 10
  [4,16,30,24,-10,26,24,-6,26,24,6,30,24,10],
// 
// 1 16 0 24 0 30 0 0 0 -24 0 0 0 10 box4t.dat
  [1,16,0,24,0,30,0,0,0,-24,0,0,0,10, ldraw_lib__box4t()],
// 
// 1 16 20 0 0 1 0 0 0 1 0 0 0 1 stud.dat
  [1,16,20,0,0,1,0,0,0,1,0,0,0,1, ldraw_lib__stud()],
// 1 16 0 0 0 1 0 0 0 1 0 0 0 1 stud.dat
  [1,16,0,0,0,1,0,0,0,1,0,0,0,1, ldraw_lib__stud()],
// 1 16 -20 0 0 1 0 0 0 1 0 0 0 1 stud.dat
  [1,16,-20,0,0,1,0,0,0,1,0,0,0,1, ldraw_lib__stud()],
// 0
];
makepoly(ldraw_lib__s__3622s01(), line=0.2);
// file: 3622.scad
use <../lib.scad>
use <s/3622s01.scad>
function ldraw_lib__3622() = [
// 0 Brick  1 x  3
// 0 Name: 3622.dat
// 0 Author: James Jessiman
// 0 !LDRAW_ORG Part UPDATE 2004-02
// 0 !LICENSE Licensed under CC BY 2.0 and CC BY 4.0 : see CAreadme.txt
// 
// 0 BFC CERTIFY CCW
  [0,"BFC","CERTIFY"],
  [0,"BFC","CCW"],
// 
// 0 !HISTORY 2003-10-15 [westrate] Subfiled, BFC'd
// 0 !HISTORY 2004-04-22 [PTadmin] Official Update 2004-02
// 0 !HISTORY 2007-06-25 [PTadmin] Header formatted for Contributor Agreement
// 0 !HISTORY 2008-07-01 [PTadmin] Official Update 2008-01
// 
// 
// 1 16 0 0 0 1 0 0 0 1 0 0 0 1 s\3622s01.dat
  [1,16,0,0,0,1,0,0,0,1,0,0,0,1, ldraw_lib__s__3622s01()],
// 4 16 30 0 -10 -30 0 -10 -30 24 -10 30 24 -10
  [4,16,30,0,-10,-30,0,-10,-30,24,-10,30,24,-10],
// 0
];
makepoly(ldraw_lib__3622(), line=0.2);
// main file
use <../lib.scad>
use <3622.scad>
use <820672e.scad>
function ldraw_lib__3622d08() = [
// 0 Brick  1 x  3 with White "VIKING" Sticker
// 0 Name: 3622d08.dat
// 0 Author: Takeshi Takahashi [RainbowDolphin]
// 0 !LDRAW_ORG Shortcut UPDATE 2024-07
// 0 !LICENSE Licensed under CC BY 4.0 : see CAreadme.txt
// 
// 0 BFC CERTIFY CCW
  [0,"BFC","CERTIFY"],
  [0,"BFC","CCW"],
// 
// 0 !CATEGORY Sticker Shortcut
// 0 !KEYWORDS Bricklink 3622pb019, Crane, Intercoastal Seaport, Set 6541
// 
// 0 !HISTORY 2024-08-26 [OrionP] Official Update 2024-07
// 
// 1 16 0 0 0 1 0 0 0 1 0 0 0 1 3622.dat
  [1,16,0,0,0,1,0,0,0,1,0,0,0,1, ldraw_lib__3622()],
// 1 16 0 12 -10 1 0 0 0 0 -1 0 1 0 820672e.dat
  [1,16,0,12,-10,1,0,0,0,0,-1,0,1,0, ldraw_lib__820672e()],
];
module ldraw_lib__3622d08(step=0, col=false, unit=2/5, alt=false, line=0.2, solid=!$preview)
    makepoly(ldraw_lib__3622d08(), step=step, col=col, unit=unit, alt=alt, line=line, solid=solid);
ldraw_lib__3622d08(line=0.2);
